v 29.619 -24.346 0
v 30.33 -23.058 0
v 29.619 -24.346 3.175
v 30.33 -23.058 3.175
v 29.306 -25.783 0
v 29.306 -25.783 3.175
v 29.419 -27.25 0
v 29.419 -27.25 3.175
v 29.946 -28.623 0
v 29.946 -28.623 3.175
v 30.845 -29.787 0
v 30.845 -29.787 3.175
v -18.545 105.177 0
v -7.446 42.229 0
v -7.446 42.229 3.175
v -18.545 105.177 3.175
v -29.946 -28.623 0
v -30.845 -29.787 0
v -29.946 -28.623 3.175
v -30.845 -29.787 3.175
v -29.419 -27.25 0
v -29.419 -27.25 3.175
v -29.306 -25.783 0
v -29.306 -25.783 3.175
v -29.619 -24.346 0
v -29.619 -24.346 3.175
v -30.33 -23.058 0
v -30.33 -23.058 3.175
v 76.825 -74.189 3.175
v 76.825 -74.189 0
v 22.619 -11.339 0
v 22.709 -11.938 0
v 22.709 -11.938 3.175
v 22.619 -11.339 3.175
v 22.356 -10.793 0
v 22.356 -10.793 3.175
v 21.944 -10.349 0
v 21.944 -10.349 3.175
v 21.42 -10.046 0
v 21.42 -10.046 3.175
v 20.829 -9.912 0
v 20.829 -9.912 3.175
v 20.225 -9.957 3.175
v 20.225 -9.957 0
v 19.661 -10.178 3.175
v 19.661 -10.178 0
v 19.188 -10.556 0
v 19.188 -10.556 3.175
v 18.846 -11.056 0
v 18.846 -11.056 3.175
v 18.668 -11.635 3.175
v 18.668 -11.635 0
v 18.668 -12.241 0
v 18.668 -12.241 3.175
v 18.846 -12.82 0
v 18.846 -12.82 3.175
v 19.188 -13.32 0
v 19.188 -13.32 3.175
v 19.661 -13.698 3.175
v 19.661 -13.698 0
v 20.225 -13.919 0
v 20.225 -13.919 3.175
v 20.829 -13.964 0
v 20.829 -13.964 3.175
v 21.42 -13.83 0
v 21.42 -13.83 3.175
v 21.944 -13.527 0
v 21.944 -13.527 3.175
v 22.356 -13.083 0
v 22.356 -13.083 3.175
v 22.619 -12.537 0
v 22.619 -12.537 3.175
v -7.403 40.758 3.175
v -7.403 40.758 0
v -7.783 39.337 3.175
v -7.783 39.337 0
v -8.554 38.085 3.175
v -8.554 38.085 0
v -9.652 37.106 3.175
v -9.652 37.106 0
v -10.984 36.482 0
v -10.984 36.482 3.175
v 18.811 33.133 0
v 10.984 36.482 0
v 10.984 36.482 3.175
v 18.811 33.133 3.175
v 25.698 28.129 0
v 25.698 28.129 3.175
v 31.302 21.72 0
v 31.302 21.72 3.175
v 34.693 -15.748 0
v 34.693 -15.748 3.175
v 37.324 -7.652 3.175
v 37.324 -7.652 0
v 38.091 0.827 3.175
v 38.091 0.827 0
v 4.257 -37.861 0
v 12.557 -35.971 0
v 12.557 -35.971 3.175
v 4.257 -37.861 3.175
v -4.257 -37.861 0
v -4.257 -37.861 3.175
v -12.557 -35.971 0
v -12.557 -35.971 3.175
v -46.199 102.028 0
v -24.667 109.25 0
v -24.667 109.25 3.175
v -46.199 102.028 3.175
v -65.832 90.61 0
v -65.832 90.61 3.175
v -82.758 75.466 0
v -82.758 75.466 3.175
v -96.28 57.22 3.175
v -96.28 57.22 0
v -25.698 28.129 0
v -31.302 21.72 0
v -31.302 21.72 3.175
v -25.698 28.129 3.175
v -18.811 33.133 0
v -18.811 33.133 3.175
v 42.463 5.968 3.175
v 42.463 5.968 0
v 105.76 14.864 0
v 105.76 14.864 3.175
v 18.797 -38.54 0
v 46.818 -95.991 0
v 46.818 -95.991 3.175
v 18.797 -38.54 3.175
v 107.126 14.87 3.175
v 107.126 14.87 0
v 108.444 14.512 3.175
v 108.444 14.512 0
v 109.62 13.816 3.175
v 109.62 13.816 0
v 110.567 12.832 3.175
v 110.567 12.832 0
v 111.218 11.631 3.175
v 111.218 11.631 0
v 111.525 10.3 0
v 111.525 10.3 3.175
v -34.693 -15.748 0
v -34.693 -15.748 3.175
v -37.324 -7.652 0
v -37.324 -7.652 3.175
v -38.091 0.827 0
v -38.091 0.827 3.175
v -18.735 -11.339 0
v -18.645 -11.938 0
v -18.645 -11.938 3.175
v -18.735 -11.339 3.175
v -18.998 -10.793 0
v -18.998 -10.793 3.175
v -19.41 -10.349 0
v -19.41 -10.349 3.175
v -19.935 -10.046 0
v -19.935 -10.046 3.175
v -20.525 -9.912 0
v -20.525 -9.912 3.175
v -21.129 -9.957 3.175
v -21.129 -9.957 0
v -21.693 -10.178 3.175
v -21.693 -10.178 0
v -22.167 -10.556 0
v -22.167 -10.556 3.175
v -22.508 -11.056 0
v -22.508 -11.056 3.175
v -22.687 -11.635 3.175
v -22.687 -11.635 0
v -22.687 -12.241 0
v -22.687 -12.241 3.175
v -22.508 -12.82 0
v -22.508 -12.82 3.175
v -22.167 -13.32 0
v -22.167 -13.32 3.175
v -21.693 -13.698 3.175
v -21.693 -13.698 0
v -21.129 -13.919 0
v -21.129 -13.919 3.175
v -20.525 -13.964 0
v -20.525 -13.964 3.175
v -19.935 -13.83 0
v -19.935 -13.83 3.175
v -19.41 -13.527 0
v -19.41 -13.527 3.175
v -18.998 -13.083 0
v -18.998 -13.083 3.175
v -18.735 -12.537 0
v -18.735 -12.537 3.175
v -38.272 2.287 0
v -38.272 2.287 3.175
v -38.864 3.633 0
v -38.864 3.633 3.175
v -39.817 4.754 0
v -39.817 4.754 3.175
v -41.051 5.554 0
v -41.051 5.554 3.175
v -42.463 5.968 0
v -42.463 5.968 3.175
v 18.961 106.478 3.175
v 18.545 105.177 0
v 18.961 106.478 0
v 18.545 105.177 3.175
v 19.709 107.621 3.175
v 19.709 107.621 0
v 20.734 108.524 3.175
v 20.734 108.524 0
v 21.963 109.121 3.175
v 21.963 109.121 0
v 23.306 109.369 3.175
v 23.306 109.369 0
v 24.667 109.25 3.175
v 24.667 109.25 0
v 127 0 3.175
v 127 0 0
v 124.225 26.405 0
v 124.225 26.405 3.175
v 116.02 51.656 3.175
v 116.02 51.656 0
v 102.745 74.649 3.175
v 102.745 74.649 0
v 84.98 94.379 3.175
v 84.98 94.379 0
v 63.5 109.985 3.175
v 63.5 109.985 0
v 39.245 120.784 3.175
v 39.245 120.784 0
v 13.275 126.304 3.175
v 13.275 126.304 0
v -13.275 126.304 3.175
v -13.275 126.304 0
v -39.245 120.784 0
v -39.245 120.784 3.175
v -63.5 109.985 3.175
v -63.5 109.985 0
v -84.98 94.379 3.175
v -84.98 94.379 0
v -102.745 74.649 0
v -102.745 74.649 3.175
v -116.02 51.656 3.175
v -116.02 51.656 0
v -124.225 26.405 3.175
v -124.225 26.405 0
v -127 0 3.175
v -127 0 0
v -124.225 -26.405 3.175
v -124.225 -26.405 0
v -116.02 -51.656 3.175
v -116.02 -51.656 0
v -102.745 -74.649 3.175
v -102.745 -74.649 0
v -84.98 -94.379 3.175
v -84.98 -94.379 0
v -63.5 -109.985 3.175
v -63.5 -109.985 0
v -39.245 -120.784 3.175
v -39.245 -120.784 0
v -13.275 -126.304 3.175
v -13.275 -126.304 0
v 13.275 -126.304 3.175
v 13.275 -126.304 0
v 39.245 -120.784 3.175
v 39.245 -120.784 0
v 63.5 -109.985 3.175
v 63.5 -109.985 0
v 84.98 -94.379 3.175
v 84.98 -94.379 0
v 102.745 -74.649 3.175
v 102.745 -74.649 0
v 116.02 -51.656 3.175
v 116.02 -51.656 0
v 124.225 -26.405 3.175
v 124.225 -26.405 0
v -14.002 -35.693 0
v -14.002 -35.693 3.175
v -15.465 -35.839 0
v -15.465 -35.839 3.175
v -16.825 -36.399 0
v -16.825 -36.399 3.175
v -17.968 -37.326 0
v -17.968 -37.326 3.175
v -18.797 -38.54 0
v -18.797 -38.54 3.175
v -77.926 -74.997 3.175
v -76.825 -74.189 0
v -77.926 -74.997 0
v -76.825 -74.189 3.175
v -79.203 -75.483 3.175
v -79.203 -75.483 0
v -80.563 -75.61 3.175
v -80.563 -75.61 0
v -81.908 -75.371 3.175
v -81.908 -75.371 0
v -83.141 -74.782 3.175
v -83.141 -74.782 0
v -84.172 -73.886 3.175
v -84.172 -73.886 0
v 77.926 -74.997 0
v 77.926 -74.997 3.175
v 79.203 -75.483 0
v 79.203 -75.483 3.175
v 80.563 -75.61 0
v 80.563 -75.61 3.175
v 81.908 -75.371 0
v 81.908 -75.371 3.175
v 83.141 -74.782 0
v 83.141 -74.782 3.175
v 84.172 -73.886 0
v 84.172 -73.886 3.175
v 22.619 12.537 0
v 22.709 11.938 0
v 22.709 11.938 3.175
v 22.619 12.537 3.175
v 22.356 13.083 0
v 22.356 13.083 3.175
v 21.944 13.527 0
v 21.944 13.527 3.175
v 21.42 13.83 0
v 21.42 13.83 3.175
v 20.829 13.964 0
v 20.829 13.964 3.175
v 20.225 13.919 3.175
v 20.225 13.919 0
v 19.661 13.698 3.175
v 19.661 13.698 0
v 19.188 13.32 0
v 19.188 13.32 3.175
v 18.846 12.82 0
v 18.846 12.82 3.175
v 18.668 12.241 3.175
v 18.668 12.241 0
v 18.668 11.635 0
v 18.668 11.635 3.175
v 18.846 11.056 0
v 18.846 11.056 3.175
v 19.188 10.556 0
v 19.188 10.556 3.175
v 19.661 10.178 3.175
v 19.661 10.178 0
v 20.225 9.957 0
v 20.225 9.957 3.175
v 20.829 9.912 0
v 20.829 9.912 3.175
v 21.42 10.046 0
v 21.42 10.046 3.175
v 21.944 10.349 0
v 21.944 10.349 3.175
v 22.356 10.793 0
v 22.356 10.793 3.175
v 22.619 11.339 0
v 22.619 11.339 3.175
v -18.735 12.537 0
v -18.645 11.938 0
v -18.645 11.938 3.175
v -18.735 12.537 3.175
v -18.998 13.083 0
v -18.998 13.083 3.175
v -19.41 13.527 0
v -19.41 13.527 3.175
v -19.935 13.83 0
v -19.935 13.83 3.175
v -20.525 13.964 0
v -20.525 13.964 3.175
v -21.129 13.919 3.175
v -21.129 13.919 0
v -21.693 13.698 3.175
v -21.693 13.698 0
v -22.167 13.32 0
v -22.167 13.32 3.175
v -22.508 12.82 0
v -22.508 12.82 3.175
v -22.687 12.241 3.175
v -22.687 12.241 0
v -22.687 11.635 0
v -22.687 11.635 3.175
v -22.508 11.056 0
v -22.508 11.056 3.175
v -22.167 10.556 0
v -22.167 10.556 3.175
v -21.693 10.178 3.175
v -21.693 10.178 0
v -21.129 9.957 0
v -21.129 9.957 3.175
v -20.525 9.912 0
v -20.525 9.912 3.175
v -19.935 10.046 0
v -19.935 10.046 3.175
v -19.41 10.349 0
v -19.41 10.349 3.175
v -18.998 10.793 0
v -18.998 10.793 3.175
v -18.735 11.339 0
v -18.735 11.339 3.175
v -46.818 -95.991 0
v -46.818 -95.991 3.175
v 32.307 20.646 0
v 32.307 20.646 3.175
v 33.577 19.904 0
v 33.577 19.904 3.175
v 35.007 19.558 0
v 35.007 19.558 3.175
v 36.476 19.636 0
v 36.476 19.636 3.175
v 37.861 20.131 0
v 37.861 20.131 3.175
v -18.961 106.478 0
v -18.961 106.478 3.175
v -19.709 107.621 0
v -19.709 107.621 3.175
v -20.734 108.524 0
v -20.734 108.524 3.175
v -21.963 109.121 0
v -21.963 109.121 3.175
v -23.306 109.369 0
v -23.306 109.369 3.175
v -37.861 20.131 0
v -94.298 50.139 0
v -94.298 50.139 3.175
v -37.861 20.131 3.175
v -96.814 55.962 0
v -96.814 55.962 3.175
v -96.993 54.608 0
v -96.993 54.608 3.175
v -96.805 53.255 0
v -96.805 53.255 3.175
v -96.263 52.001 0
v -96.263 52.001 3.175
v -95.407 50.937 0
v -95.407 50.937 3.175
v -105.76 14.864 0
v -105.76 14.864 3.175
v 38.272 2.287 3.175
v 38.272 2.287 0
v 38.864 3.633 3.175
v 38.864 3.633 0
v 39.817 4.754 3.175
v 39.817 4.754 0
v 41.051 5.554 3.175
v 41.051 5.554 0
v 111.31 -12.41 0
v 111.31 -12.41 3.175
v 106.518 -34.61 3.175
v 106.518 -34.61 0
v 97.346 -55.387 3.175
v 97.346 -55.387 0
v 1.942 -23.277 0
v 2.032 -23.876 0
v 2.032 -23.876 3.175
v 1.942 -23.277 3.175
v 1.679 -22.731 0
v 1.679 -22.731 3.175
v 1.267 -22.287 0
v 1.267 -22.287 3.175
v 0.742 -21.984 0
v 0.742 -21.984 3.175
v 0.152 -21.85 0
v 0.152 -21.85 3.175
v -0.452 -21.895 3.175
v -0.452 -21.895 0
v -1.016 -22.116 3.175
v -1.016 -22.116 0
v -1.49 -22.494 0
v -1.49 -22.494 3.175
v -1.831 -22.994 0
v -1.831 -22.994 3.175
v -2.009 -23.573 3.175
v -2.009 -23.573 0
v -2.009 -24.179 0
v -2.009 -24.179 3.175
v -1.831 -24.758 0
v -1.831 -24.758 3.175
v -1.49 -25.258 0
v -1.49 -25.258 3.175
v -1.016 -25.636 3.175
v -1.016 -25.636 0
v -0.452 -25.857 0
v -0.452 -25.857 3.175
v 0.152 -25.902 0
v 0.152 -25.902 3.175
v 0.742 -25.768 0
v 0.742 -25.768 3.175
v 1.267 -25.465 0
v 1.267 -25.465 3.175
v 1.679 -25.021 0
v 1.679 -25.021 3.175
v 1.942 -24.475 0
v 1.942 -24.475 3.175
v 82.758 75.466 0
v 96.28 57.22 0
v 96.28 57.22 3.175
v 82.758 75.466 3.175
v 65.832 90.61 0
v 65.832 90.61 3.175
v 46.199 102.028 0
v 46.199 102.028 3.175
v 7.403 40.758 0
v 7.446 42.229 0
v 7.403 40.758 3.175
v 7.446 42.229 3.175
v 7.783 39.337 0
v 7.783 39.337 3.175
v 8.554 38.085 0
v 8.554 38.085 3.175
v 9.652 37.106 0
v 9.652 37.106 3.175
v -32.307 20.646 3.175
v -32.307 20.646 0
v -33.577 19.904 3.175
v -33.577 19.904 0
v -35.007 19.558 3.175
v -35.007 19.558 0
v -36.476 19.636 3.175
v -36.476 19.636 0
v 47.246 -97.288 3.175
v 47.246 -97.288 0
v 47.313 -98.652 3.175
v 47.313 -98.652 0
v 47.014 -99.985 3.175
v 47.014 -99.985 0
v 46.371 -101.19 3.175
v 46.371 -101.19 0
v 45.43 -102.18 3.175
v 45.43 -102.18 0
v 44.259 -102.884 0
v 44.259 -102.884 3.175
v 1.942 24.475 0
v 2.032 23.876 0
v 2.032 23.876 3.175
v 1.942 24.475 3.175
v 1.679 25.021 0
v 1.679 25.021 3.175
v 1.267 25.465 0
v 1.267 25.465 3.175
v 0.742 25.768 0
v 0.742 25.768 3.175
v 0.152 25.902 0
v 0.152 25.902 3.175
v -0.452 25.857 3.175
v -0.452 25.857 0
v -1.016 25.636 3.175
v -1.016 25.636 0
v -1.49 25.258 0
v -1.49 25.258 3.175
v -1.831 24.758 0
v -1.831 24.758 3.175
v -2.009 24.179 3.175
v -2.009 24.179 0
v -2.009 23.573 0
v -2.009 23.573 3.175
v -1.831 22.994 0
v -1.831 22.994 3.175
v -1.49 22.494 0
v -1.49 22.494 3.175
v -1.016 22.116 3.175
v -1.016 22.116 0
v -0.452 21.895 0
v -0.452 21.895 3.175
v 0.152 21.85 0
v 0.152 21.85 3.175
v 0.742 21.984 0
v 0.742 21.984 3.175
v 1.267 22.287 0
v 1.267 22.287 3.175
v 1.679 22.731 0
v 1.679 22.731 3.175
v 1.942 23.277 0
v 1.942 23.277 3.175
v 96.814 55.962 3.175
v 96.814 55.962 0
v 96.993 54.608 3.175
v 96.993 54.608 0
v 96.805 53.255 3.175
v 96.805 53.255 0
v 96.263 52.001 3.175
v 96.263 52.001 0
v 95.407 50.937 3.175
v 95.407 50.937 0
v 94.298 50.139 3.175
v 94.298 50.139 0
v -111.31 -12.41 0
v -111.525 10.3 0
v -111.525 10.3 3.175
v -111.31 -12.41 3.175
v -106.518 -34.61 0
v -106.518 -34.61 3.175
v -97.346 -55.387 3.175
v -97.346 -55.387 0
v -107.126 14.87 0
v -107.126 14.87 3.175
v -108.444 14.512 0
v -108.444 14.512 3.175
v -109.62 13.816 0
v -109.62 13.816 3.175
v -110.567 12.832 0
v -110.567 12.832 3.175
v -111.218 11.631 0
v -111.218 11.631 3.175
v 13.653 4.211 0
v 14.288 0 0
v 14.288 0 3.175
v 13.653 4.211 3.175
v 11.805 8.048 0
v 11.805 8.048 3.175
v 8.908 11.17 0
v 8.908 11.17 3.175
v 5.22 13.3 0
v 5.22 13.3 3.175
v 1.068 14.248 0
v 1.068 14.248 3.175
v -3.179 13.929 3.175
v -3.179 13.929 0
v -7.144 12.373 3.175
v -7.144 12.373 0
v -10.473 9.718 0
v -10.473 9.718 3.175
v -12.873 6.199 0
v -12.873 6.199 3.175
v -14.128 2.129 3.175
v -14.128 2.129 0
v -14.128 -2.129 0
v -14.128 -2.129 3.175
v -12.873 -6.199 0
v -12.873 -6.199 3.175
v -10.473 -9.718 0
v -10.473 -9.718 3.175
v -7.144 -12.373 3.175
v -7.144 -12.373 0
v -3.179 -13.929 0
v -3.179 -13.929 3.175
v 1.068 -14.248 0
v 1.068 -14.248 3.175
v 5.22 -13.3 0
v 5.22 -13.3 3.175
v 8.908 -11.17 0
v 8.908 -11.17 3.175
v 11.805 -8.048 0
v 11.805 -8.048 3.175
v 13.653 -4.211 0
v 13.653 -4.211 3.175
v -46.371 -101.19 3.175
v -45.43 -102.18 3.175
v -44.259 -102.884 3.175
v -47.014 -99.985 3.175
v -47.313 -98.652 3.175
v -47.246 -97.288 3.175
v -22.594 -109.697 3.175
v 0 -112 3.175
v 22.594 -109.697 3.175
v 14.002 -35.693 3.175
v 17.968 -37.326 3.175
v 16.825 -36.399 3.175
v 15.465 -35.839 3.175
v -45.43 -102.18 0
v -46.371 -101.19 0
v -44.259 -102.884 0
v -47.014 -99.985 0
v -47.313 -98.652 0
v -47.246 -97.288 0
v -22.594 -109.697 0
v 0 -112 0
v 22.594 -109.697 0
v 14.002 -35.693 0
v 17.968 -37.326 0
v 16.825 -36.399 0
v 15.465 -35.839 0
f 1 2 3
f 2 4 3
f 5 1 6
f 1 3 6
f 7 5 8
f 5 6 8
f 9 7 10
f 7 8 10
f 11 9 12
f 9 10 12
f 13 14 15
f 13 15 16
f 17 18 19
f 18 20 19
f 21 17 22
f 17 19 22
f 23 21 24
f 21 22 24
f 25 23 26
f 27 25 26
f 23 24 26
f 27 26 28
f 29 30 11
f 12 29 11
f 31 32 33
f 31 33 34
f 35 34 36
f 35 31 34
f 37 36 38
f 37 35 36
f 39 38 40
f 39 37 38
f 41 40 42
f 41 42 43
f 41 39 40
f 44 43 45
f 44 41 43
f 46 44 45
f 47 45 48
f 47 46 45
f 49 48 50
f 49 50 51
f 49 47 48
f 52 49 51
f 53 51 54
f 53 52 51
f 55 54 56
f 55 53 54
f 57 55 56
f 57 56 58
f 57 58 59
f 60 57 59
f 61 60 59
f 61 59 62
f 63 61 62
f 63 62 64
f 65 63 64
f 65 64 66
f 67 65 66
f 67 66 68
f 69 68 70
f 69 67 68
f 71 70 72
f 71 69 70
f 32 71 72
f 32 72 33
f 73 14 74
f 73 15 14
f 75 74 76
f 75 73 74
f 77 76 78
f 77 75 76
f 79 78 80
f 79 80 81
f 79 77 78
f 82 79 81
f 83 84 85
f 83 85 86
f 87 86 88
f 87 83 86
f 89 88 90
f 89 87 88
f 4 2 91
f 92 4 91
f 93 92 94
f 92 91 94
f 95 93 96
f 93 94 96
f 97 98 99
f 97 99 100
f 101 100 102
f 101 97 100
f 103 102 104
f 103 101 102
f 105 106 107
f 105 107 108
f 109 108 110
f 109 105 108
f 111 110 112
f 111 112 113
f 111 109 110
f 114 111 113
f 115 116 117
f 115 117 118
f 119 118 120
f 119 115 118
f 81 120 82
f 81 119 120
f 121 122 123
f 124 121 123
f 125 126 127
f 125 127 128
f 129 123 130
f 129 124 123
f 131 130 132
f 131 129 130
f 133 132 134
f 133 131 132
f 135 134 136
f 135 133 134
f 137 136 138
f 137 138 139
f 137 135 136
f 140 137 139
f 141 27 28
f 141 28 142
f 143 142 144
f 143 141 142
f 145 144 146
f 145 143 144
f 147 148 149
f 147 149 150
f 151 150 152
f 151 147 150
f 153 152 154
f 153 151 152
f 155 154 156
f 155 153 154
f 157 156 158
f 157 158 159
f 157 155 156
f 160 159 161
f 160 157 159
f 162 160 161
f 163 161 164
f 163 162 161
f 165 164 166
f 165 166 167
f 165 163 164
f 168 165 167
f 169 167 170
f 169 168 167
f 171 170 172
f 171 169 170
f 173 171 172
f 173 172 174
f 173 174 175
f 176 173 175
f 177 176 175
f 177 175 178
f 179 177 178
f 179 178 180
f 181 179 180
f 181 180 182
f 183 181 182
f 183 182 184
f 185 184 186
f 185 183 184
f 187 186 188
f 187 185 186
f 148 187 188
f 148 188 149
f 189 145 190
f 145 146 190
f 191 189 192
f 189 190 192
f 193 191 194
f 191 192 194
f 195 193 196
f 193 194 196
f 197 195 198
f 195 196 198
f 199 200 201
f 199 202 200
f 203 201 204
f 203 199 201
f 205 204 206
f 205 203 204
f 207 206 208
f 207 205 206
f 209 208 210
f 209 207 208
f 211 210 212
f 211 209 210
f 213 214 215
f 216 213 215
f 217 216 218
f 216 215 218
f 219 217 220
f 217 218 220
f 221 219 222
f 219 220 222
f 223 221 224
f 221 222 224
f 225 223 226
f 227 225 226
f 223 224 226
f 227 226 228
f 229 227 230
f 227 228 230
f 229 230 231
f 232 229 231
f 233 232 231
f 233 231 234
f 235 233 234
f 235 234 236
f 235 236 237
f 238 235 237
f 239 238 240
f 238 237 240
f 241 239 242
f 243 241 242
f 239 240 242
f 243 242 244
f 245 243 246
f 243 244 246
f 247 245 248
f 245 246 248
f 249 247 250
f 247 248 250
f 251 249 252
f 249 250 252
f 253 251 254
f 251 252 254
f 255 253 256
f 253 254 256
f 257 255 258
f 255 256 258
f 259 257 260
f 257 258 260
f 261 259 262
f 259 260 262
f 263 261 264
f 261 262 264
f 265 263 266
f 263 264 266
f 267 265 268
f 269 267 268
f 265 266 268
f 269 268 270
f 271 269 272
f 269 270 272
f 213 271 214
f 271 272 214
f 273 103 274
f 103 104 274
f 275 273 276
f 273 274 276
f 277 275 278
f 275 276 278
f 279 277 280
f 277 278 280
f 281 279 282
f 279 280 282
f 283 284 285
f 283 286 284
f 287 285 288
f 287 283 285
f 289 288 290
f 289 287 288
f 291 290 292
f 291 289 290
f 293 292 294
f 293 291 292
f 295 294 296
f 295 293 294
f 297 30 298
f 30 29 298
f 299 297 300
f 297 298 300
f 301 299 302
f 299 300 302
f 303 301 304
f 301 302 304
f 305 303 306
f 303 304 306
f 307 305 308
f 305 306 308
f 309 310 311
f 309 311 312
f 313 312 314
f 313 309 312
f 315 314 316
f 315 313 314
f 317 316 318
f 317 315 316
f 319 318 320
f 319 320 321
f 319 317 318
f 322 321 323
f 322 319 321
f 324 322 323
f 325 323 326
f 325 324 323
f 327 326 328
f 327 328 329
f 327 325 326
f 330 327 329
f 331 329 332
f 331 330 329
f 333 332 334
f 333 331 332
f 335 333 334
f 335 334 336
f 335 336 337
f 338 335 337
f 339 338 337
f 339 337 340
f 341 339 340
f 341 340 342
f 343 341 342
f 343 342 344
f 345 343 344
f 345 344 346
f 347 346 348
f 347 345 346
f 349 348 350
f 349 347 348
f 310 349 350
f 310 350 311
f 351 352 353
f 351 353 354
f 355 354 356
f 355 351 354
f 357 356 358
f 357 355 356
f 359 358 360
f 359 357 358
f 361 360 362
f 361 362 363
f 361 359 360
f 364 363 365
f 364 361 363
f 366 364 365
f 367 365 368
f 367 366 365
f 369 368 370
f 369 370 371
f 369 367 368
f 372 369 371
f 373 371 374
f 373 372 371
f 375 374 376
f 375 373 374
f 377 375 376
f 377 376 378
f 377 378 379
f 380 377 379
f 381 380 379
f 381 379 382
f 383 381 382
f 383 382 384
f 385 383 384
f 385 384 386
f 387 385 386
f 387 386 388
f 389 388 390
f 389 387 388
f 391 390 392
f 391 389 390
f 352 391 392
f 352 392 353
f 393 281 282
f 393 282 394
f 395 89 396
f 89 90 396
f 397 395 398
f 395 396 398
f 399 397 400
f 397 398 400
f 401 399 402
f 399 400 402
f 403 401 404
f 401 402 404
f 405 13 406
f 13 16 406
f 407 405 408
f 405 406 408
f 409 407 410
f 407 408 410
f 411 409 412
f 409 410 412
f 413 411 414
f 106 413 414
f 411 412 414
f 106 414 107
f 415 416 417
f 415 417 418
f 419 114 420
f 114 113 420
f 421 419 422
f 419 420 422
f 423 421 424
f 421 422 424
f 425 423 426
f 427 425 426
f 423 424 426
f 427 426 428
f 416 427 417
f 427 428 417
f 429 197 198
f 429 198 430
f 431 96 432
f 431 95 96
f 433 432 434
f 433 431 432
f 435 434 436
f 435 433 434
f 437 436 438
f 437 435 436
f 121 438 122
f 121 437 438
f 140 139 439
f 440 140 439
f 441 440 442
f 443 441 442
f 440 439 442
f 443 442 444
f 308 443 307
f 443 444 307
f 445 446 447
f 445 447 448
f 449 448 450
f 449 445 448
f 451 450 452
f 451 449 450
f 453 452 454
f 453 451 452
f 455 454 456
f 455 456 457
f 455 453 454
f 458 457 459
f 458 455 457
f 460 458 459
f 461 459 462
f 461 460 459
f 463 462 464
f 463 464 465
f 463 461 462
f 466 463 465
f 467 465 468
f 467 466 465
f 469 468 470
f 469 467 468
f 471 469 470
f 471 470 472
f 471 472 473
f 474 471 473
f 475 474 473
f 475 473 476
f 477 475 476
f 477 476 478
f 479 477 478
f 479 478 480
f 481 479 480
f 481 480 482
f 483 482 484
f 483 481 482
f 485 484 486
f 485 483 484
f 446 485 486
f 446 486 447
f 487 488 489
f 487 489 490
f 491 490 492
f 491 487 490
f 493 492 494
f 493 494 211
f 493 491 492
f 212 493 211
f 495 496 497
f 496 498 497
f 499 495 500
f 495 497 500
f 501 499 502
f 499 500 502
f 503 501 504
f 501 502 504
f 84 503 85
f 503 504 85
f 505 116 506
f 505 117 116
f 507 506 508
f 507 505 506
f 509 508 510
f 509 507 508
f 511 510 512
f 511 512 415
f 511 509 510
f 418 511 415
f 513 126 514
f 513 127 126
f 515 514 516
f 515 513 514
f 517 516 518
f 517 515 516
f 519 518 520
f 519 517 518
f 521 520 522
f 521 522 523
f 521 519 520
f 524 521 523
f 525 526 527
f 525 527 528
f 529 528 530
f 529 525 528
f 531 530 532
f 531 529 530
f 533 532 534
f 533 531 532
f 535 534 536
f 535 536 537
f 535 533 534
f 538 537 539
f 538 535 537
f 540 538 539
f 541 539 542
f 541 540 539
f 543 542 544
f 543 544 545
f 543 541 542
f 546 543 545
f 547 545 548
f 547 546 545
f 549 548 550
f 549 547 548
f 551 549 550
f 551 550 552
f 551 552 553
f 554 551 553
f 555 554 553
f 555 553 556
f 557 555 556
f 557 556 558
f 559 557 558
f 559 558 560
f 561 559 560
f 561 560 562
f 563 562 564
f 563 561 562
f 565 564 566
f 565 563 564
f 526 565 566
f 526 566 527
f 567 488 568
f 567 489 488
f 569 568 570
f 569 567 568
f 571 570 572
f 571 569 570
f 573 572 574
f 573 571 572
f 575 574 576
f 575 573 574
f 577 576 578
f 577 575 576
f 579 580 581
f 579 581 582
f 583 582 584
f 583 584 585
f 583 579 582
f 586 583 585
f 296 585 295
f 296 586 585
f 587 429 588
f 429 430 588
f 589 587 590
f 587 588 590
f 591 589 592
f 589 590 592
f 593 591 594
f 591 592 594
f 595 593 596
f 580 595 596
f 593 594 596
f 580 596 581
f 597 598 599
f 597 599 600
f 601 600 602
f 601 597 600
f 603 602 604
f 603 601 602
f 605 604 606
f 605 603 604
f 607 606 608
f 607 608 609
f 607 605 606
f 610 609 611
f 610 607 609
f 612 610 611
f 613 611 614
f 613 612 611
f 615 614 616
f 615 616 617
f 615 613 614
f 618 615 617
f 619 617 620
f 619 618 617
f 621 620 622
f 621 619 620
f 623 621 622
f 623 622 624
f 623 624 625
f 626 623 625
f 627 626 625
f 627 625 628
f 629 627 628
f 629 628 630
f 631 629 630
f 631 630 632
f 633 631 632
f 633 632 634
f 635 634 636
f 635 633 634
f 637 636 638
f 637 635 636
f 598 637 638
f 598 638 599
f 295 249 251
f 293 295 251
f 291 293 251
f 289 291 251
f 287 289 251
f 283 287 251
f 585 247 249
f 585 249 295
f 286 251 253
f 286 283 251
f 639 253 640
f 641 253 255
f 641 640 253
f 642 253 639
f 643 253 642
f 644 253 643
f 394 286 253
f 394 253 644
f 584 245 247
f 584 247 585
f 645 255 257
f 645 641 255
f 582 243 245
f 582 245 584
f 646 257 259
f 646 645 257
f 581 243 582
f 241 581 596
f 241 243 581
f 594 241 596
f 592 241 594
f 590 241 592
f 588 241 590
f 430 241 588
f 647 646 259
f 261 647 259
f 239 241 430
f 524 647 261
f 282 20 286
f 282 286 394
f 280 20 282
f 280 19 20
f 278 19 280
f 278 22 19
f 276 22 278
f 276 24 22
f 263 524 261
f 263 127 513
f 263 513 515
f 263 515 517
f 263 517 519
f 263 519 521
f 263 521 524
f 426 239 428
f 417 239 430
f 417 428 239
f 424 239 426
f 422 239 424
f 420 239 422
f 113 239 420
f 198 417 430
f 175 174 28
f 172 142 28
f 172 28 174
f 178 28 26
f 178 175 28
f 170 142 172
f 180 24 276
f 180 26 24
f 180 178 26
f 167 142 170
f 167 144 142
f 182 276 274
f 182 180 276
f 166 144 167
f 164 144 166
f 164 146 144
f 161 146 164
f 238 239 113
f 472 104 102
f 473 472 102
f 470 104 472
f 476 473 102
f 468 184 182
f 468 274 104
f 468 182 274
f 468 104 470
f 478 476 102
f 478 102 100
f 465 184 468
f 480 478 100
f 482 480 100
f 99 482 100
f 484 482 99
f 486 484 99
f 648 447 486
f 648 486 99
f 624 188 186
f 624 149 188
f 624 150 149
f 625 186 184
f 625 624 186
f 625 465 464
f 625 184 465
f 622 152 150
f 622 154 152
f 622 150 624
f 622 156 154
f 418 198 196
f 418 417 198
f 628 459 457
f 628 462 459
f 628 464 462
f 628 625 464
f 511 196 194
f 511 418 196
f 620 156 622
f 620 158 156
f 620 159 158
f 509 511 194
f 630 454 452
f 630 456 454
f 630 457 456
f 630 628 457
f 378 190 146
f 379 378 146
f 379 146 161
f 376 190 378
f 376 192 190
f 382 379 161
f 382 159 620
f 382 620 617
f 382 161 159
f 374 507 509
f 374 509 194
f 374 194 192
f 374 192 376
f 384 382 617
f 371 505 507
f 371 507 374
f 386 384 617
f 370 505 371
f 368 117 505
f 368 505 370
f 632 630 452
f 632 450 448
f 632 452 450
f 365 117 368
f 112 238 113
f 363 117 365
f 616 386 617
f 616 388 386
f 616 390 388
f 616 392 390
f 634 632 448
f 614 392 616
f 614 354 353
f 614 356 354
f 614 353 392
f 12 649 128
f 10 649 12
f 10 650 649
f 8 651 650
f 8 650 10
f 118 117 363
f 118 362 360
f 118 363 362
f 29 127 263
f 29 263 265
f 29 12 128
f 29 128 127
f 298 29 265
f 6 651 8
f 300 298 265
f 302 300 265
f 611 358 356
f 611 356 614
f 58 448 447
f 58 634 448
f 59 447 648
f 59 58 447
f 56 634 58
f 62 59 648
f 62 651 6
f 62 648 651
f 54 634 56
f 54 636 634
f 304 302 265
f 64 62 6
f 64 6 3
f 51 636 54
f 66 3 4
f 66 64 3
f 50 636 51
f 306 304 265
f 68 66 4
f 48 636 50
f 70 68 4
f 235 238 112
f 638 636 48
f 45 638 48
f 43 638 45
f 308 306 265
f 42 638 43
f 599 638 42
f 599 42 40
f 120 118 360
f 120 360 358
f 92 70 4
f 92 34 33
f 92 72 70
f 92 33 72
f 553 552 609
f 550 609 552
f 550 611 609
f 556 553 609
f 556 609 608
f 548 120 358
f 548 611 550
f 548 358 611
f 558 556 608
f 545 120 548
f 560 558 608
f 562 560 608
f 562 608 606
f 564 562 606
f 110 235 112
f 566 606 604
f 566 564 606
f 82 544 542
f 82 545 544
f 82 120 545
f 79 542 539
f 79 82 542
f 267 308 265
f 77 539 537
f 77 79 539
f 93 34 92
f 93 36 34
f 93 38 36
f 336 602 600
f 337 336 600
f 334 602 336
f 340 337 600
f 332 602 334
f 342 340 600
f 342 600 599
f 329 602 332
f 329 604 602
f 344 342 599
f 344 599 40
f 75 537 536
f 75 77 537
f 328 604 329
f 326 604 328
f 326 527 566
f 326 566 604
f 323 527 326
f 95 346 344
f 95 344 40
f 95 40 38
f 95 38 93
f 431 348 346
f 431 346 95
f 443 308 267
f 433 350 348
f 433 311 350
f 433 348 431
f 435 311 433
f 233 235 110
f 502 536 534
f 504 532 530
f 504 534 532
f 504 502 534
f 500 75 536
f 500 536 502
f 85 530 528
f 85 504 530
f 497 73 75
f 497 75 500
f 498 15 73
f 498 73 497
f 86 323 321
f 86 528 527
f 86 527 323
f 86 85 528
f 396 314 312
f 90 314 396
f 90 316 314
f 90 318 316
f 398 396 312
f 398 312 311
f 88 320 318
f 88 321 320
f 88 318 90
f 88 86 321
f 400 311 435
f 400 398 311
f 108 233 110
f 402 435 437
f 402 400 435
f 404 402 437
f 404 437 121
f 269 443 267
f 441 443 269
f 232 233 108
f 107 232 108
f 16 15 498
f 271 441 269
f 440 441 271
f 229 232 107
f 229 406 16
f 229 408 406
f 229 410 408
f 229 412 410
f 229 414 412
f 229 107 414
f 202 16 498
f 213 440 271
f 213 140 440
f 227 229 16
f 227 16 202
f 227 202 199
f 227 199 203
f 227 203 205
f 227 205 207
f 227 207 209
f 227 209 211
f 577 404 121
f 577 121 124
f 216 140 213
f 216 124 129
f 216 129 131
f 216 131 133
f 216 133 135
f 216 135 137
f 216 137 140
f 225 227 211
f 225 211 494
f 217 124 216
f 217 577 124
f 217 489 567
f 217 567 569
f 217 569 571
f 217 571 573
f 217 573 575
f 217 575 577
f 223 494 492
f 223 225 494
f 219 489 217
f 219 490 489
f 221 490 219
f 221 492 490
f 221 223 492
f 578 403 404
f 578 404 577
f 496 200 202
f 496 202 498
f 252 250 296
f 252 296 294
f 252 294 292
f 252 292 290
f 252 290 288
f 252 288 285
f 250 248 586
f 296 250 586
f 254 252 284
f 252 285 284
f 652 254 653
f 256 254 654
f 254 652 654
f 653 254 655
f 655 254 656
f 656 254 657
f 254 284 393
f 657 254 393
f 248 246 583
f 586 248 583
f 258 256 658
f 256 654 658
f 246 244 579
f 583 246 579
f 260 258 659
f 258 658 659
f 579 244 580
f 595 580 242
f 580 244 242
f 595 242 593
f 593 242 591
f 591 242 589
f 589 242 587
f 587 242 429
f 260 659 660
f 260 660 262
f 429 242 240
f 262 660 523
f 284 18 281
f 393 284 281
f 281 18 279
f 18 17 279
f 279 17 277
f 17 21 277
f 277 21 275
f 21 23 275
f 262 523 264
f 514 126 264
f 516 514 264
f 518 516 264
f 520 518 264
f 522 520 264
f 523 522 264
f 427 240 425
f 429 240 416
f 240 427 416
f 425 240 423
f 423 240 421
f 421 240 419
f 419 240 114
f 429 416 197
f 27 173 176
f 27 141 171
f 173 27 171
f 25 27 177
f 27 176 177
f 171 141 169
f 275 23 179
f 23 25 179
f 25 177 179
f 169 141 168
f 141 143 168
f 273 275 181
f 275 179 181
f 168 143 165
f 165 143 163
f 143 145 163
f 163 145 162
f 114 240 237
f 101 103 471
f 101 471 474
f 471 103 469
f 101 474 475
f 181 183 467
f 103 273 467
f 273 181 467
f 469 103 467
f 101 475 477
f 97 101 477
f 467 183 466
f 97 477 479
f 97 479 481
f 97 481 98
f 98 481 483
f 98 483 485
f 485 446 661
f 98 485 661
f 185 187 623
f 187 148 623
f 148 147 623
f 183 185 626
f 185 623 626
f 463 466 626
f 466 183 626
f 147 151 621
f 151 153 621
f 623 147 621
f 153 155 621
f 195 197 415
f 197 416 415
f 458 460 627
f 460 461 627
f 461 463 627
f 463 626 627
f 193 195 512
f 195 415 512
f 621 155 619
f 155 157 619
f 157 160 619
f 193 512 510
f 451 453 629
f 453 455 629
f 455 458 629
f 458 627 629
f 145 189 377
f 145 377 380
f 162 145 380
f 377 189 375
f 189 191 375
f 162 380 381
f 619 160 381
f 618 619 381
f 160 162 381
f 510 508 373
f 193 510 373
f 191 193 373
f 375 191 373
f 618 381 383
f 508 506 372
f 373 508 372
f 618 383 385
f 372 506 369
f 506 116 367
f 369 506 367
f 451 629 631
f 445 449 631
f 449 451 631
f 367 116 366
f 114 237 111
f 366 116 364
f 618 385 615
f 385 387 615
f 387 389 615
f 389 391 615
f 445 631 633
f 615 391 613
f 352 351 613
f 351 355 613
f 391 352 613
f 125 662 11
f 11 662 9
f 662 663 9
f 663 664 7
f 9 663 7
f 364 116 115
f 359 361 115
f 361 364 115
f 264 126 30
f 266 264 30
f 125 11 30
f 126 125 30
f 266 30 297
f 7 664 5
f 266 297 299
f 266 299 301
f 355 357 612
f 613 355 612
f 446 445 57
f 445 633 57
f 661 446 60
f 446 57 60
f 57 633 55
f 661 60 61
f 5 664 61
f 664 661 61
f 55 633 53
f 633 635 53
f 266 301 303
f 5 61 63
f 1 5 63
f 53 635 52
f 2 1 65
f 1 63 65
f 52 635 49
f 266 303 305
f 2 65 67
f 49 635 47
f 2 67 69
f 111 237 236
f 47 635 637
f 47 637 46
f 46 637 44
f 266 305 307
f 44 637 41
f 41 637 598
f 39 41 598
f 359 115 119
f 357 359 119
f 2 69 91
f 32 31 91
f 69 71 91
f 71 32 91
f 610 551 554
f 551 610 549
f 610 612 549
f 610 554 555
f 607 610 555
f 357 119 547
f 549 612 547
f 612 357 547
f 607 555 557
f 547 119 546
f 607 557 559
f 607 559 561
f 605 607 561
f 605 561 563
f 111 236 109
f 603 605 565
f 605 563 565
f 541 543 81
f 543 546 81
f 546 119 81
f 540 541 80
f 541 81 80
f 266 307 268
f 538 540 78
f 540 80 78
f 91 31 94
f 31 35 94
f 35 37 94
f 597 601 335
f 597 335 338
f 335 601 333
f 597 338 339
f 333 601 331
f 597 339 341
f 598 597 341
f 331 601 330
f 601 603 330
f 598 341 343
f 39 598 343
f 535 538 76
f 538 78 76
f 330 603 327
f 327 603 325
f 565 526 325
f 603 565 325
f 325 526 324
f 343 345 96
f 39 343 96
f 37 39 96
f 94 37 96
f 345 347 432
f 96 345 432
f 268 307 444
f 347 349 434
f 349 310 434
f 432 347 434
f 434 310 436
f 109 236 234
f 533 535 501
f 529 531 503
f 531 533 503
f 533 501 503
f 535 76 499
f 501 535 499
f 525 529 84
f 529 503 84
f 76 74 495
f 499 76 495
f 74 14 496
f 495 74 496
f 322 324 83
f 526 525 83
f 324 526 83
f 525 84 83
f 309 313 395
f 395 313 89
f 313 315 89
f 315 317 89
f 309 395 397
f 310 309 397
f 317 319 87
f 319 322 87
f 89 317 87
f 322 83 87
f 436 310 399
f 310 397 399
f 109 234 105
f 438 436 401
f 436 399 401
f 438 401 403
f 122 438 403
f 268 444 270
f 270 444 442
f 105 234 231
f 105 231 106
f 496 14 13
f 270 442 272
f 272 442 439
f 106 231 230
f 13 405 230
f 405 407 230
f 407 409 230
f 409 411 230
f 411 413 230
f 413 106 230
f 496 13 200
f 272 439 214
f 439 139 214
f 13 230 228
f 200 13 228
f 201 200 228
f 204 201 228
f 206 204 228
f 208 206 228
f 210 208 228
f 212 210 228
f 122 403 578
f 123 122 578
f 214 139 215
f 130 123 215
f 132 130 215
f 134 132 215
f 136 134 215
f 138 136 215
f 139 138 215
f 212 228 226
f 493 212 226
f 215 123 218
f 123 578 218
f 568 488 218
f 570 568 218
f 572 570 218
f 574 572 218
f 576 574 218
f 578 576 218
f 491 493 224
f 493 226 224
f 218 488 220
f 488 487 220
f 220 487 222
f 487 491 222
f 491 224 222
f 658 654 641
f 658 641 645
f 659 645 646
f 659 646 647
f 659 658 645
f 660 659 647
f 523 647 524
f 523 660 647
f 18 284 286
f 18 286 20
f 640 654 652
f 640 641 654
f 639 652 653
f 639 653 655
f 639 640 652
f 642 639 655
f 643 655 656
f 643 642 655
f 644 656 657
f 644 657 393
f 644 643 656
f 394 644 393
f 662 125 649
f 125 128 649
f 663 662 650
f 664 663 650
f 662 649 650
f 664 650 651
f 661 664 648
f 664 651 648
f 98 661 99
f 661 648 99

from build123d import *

# Parameters (mm, degrees)
SKETCH1_R           = 127
SKETCH1_R_2         = 14.2875
SKETCH1_R_3         = 2.032
BOSS_EXTRUDE2_DEPTH = 3.175
FILLET1_R           = 5.08
FILLET3_R           = 5.08


with BuildPart() as part:
    # Sketch1 → Boss-Extrude2 (new body)
    with BuildSketch(Plane.XY):
        Circle(SKETCH1_R)
        Circle(SKETCH1_R_2, mode=Mode.SUBTRACT)
        with Locations((0, 23.876)):
            Circle(SKETCH1_R_3, mode=Mode.SUBTRACT)
        with Locations((20.677222541, 11.938)):
            Circle(SKETCH1_R_3, mode=Mode.SUBTRACT)
        with Locations((20.677222541, -11.938)):
            Circle(SKETCH1_R_3, mode=Mode.SUBTRACT)
        with Locations((0, -23.876)):
            Circle(SKETCH1_R_3, mode=Mode.SUBTRACT)
        with Locations((-20.677222541, -11.938)):
            Circle(SKETCH1_R_3, mode=Mode.SUBTRACT)
        with Locations((-20.677222541, 11.938)):
            Circle(SKETCH1_R_3, mode=Mode.SUBTRACT)
        with BuildLine():
            Line((19.448595899, 110.298468337), (6.615995569, 37.52117539))
            ThreePointArc((6.615995569, 37.52117539), (22.394618112, 30.823547486), (33.640303288, 17.886866542))
            Line((33.640303288, 17.886866542), (98.8901304, 52.580815032))
            ThreePointArc((98.8901304, 52.580815032), (65.831948257, 90.60990337), (19.448595899, 110.298468337))
        make_face(mode=Mode.SUBTRACT)
        with BuildLine():
            Line((-6.615995569, 37.52117539), (-19.448595899, 110.298468337))
            ThreePointArc((-19.448595899, 110.298468337), (-65.831948257, 90.60990337), (-98.8901304, 52.580815032))
            Line((-98.8901304, 52.580815032), (-33.640303288, 17.886866542))
            ThreePointArc((-33.640303288, 17.886866542), (-22.394618112, 30.823547486), (-6.615995569, 37.52117539))
        make_face(mode=Mode.SUBTRACT)
        with BuildLine():
            Line((37.729213419, 5.302495147), (110.910023699, 15.587387308))
            ThreePointArc((110.910023699, 15.587387308), (106.518329825, -34.60990337), (80.566057638, -77.801737491))
            Line((80.566057638, -77.801737491), (27.406846393, -26.466483914))
            ThreePointArc((27.406846393, -26.466483914), (36.235253271, -11.773547486), (37.729213419, 5.302495147))
        make_face(mode=Mode.SUBTRACT)
        with BuildLine():
            Line((49.09756844, -100.664933186), (16.701940693, -34.244053164))
            ThreePointArc((16.701940693, -34.244053164), (0, -38.1), (-16.701940693, -34.244053164))
            Line((-16.701940693, -34.244053164), (-49.09756844, -100.664933186))
            ThreePointArc((-49.09756844, -100.664933186), (0, -112), (49.09756844, -100.664933186))
        make_face(mode=Mode.SUBTRACT)
        with BuildLine():
            Line((-80.566057638, -77.801737491), (-27.406846393, -26.466483914))
            ThreePointArc((-27.406846393, -26.466483914), (-36.235253271, -11.773547486), (-37.729213419, 5.302495147))
            Line((-37.729213419, 5.302495147), (-110.910023699, 15.587387308))
            ThreePointArc((-110.910023699, 15.587387308), (-106.518329825, -34.60990337), (-80.566057638, -77.801737491))
        make_face(mode=Mode.SUBTRACT)
    extrude(amount=BOSS_EXTRUDE2_DEPTH)

    # Fillet1
    fillet1_edges = [part.edges().sort_by_distance(p)[0] for p in [
        (98.8901304, 52.580815032, 1.5875),
        (19.448595899, 110.298468337, 1.5875),
        (6.615995569, 37.52117539, 1.5875),
        (33.640303288, 17.886866542, 1.5875),
    ]]
    fillet(fillet1_edges, radius=FILLET1_R)

    # Fillet3
    fillet3_edges = [part.edges().sort_by_distance(p)[0] for p in [
        (-33.640303288, 17.886866542, 1.5875),
        (-6.615995569, 37.52117539, 1.5875),
        (-19.448595899, 110.298468337, 1.5875),
        (-98.8901304, 52.580815032, 1.5875),
        (37.729213419, 5.302495147, 1.5875),
        (27.406846393, -26.466483914, 1.5875),
        (80.566057638, -77.801737491, 1.5875),
        (110.910023699, 15.587387308, 1.5875),
        (-49.09756844, -100.664933186, 1.5875),
        (49.09756844, -100.664933186, 1.5875),
        (16.701940693, -34.244053164, 1.5875),
        (-16.701940693, -34.244053164, 1.5875),
        (-110.910023699, 15.587387308, 1.5875),
        (-80.566057638, -77.801737491, 1.5875),
        (-27.406846393, -26.466483914, 1.5875),
        (-37.729213419, 5.302495147, 1.5875),
    ]]
    fillet(fillet3_edges, radius=FILLET3_R)


solid = part.part
